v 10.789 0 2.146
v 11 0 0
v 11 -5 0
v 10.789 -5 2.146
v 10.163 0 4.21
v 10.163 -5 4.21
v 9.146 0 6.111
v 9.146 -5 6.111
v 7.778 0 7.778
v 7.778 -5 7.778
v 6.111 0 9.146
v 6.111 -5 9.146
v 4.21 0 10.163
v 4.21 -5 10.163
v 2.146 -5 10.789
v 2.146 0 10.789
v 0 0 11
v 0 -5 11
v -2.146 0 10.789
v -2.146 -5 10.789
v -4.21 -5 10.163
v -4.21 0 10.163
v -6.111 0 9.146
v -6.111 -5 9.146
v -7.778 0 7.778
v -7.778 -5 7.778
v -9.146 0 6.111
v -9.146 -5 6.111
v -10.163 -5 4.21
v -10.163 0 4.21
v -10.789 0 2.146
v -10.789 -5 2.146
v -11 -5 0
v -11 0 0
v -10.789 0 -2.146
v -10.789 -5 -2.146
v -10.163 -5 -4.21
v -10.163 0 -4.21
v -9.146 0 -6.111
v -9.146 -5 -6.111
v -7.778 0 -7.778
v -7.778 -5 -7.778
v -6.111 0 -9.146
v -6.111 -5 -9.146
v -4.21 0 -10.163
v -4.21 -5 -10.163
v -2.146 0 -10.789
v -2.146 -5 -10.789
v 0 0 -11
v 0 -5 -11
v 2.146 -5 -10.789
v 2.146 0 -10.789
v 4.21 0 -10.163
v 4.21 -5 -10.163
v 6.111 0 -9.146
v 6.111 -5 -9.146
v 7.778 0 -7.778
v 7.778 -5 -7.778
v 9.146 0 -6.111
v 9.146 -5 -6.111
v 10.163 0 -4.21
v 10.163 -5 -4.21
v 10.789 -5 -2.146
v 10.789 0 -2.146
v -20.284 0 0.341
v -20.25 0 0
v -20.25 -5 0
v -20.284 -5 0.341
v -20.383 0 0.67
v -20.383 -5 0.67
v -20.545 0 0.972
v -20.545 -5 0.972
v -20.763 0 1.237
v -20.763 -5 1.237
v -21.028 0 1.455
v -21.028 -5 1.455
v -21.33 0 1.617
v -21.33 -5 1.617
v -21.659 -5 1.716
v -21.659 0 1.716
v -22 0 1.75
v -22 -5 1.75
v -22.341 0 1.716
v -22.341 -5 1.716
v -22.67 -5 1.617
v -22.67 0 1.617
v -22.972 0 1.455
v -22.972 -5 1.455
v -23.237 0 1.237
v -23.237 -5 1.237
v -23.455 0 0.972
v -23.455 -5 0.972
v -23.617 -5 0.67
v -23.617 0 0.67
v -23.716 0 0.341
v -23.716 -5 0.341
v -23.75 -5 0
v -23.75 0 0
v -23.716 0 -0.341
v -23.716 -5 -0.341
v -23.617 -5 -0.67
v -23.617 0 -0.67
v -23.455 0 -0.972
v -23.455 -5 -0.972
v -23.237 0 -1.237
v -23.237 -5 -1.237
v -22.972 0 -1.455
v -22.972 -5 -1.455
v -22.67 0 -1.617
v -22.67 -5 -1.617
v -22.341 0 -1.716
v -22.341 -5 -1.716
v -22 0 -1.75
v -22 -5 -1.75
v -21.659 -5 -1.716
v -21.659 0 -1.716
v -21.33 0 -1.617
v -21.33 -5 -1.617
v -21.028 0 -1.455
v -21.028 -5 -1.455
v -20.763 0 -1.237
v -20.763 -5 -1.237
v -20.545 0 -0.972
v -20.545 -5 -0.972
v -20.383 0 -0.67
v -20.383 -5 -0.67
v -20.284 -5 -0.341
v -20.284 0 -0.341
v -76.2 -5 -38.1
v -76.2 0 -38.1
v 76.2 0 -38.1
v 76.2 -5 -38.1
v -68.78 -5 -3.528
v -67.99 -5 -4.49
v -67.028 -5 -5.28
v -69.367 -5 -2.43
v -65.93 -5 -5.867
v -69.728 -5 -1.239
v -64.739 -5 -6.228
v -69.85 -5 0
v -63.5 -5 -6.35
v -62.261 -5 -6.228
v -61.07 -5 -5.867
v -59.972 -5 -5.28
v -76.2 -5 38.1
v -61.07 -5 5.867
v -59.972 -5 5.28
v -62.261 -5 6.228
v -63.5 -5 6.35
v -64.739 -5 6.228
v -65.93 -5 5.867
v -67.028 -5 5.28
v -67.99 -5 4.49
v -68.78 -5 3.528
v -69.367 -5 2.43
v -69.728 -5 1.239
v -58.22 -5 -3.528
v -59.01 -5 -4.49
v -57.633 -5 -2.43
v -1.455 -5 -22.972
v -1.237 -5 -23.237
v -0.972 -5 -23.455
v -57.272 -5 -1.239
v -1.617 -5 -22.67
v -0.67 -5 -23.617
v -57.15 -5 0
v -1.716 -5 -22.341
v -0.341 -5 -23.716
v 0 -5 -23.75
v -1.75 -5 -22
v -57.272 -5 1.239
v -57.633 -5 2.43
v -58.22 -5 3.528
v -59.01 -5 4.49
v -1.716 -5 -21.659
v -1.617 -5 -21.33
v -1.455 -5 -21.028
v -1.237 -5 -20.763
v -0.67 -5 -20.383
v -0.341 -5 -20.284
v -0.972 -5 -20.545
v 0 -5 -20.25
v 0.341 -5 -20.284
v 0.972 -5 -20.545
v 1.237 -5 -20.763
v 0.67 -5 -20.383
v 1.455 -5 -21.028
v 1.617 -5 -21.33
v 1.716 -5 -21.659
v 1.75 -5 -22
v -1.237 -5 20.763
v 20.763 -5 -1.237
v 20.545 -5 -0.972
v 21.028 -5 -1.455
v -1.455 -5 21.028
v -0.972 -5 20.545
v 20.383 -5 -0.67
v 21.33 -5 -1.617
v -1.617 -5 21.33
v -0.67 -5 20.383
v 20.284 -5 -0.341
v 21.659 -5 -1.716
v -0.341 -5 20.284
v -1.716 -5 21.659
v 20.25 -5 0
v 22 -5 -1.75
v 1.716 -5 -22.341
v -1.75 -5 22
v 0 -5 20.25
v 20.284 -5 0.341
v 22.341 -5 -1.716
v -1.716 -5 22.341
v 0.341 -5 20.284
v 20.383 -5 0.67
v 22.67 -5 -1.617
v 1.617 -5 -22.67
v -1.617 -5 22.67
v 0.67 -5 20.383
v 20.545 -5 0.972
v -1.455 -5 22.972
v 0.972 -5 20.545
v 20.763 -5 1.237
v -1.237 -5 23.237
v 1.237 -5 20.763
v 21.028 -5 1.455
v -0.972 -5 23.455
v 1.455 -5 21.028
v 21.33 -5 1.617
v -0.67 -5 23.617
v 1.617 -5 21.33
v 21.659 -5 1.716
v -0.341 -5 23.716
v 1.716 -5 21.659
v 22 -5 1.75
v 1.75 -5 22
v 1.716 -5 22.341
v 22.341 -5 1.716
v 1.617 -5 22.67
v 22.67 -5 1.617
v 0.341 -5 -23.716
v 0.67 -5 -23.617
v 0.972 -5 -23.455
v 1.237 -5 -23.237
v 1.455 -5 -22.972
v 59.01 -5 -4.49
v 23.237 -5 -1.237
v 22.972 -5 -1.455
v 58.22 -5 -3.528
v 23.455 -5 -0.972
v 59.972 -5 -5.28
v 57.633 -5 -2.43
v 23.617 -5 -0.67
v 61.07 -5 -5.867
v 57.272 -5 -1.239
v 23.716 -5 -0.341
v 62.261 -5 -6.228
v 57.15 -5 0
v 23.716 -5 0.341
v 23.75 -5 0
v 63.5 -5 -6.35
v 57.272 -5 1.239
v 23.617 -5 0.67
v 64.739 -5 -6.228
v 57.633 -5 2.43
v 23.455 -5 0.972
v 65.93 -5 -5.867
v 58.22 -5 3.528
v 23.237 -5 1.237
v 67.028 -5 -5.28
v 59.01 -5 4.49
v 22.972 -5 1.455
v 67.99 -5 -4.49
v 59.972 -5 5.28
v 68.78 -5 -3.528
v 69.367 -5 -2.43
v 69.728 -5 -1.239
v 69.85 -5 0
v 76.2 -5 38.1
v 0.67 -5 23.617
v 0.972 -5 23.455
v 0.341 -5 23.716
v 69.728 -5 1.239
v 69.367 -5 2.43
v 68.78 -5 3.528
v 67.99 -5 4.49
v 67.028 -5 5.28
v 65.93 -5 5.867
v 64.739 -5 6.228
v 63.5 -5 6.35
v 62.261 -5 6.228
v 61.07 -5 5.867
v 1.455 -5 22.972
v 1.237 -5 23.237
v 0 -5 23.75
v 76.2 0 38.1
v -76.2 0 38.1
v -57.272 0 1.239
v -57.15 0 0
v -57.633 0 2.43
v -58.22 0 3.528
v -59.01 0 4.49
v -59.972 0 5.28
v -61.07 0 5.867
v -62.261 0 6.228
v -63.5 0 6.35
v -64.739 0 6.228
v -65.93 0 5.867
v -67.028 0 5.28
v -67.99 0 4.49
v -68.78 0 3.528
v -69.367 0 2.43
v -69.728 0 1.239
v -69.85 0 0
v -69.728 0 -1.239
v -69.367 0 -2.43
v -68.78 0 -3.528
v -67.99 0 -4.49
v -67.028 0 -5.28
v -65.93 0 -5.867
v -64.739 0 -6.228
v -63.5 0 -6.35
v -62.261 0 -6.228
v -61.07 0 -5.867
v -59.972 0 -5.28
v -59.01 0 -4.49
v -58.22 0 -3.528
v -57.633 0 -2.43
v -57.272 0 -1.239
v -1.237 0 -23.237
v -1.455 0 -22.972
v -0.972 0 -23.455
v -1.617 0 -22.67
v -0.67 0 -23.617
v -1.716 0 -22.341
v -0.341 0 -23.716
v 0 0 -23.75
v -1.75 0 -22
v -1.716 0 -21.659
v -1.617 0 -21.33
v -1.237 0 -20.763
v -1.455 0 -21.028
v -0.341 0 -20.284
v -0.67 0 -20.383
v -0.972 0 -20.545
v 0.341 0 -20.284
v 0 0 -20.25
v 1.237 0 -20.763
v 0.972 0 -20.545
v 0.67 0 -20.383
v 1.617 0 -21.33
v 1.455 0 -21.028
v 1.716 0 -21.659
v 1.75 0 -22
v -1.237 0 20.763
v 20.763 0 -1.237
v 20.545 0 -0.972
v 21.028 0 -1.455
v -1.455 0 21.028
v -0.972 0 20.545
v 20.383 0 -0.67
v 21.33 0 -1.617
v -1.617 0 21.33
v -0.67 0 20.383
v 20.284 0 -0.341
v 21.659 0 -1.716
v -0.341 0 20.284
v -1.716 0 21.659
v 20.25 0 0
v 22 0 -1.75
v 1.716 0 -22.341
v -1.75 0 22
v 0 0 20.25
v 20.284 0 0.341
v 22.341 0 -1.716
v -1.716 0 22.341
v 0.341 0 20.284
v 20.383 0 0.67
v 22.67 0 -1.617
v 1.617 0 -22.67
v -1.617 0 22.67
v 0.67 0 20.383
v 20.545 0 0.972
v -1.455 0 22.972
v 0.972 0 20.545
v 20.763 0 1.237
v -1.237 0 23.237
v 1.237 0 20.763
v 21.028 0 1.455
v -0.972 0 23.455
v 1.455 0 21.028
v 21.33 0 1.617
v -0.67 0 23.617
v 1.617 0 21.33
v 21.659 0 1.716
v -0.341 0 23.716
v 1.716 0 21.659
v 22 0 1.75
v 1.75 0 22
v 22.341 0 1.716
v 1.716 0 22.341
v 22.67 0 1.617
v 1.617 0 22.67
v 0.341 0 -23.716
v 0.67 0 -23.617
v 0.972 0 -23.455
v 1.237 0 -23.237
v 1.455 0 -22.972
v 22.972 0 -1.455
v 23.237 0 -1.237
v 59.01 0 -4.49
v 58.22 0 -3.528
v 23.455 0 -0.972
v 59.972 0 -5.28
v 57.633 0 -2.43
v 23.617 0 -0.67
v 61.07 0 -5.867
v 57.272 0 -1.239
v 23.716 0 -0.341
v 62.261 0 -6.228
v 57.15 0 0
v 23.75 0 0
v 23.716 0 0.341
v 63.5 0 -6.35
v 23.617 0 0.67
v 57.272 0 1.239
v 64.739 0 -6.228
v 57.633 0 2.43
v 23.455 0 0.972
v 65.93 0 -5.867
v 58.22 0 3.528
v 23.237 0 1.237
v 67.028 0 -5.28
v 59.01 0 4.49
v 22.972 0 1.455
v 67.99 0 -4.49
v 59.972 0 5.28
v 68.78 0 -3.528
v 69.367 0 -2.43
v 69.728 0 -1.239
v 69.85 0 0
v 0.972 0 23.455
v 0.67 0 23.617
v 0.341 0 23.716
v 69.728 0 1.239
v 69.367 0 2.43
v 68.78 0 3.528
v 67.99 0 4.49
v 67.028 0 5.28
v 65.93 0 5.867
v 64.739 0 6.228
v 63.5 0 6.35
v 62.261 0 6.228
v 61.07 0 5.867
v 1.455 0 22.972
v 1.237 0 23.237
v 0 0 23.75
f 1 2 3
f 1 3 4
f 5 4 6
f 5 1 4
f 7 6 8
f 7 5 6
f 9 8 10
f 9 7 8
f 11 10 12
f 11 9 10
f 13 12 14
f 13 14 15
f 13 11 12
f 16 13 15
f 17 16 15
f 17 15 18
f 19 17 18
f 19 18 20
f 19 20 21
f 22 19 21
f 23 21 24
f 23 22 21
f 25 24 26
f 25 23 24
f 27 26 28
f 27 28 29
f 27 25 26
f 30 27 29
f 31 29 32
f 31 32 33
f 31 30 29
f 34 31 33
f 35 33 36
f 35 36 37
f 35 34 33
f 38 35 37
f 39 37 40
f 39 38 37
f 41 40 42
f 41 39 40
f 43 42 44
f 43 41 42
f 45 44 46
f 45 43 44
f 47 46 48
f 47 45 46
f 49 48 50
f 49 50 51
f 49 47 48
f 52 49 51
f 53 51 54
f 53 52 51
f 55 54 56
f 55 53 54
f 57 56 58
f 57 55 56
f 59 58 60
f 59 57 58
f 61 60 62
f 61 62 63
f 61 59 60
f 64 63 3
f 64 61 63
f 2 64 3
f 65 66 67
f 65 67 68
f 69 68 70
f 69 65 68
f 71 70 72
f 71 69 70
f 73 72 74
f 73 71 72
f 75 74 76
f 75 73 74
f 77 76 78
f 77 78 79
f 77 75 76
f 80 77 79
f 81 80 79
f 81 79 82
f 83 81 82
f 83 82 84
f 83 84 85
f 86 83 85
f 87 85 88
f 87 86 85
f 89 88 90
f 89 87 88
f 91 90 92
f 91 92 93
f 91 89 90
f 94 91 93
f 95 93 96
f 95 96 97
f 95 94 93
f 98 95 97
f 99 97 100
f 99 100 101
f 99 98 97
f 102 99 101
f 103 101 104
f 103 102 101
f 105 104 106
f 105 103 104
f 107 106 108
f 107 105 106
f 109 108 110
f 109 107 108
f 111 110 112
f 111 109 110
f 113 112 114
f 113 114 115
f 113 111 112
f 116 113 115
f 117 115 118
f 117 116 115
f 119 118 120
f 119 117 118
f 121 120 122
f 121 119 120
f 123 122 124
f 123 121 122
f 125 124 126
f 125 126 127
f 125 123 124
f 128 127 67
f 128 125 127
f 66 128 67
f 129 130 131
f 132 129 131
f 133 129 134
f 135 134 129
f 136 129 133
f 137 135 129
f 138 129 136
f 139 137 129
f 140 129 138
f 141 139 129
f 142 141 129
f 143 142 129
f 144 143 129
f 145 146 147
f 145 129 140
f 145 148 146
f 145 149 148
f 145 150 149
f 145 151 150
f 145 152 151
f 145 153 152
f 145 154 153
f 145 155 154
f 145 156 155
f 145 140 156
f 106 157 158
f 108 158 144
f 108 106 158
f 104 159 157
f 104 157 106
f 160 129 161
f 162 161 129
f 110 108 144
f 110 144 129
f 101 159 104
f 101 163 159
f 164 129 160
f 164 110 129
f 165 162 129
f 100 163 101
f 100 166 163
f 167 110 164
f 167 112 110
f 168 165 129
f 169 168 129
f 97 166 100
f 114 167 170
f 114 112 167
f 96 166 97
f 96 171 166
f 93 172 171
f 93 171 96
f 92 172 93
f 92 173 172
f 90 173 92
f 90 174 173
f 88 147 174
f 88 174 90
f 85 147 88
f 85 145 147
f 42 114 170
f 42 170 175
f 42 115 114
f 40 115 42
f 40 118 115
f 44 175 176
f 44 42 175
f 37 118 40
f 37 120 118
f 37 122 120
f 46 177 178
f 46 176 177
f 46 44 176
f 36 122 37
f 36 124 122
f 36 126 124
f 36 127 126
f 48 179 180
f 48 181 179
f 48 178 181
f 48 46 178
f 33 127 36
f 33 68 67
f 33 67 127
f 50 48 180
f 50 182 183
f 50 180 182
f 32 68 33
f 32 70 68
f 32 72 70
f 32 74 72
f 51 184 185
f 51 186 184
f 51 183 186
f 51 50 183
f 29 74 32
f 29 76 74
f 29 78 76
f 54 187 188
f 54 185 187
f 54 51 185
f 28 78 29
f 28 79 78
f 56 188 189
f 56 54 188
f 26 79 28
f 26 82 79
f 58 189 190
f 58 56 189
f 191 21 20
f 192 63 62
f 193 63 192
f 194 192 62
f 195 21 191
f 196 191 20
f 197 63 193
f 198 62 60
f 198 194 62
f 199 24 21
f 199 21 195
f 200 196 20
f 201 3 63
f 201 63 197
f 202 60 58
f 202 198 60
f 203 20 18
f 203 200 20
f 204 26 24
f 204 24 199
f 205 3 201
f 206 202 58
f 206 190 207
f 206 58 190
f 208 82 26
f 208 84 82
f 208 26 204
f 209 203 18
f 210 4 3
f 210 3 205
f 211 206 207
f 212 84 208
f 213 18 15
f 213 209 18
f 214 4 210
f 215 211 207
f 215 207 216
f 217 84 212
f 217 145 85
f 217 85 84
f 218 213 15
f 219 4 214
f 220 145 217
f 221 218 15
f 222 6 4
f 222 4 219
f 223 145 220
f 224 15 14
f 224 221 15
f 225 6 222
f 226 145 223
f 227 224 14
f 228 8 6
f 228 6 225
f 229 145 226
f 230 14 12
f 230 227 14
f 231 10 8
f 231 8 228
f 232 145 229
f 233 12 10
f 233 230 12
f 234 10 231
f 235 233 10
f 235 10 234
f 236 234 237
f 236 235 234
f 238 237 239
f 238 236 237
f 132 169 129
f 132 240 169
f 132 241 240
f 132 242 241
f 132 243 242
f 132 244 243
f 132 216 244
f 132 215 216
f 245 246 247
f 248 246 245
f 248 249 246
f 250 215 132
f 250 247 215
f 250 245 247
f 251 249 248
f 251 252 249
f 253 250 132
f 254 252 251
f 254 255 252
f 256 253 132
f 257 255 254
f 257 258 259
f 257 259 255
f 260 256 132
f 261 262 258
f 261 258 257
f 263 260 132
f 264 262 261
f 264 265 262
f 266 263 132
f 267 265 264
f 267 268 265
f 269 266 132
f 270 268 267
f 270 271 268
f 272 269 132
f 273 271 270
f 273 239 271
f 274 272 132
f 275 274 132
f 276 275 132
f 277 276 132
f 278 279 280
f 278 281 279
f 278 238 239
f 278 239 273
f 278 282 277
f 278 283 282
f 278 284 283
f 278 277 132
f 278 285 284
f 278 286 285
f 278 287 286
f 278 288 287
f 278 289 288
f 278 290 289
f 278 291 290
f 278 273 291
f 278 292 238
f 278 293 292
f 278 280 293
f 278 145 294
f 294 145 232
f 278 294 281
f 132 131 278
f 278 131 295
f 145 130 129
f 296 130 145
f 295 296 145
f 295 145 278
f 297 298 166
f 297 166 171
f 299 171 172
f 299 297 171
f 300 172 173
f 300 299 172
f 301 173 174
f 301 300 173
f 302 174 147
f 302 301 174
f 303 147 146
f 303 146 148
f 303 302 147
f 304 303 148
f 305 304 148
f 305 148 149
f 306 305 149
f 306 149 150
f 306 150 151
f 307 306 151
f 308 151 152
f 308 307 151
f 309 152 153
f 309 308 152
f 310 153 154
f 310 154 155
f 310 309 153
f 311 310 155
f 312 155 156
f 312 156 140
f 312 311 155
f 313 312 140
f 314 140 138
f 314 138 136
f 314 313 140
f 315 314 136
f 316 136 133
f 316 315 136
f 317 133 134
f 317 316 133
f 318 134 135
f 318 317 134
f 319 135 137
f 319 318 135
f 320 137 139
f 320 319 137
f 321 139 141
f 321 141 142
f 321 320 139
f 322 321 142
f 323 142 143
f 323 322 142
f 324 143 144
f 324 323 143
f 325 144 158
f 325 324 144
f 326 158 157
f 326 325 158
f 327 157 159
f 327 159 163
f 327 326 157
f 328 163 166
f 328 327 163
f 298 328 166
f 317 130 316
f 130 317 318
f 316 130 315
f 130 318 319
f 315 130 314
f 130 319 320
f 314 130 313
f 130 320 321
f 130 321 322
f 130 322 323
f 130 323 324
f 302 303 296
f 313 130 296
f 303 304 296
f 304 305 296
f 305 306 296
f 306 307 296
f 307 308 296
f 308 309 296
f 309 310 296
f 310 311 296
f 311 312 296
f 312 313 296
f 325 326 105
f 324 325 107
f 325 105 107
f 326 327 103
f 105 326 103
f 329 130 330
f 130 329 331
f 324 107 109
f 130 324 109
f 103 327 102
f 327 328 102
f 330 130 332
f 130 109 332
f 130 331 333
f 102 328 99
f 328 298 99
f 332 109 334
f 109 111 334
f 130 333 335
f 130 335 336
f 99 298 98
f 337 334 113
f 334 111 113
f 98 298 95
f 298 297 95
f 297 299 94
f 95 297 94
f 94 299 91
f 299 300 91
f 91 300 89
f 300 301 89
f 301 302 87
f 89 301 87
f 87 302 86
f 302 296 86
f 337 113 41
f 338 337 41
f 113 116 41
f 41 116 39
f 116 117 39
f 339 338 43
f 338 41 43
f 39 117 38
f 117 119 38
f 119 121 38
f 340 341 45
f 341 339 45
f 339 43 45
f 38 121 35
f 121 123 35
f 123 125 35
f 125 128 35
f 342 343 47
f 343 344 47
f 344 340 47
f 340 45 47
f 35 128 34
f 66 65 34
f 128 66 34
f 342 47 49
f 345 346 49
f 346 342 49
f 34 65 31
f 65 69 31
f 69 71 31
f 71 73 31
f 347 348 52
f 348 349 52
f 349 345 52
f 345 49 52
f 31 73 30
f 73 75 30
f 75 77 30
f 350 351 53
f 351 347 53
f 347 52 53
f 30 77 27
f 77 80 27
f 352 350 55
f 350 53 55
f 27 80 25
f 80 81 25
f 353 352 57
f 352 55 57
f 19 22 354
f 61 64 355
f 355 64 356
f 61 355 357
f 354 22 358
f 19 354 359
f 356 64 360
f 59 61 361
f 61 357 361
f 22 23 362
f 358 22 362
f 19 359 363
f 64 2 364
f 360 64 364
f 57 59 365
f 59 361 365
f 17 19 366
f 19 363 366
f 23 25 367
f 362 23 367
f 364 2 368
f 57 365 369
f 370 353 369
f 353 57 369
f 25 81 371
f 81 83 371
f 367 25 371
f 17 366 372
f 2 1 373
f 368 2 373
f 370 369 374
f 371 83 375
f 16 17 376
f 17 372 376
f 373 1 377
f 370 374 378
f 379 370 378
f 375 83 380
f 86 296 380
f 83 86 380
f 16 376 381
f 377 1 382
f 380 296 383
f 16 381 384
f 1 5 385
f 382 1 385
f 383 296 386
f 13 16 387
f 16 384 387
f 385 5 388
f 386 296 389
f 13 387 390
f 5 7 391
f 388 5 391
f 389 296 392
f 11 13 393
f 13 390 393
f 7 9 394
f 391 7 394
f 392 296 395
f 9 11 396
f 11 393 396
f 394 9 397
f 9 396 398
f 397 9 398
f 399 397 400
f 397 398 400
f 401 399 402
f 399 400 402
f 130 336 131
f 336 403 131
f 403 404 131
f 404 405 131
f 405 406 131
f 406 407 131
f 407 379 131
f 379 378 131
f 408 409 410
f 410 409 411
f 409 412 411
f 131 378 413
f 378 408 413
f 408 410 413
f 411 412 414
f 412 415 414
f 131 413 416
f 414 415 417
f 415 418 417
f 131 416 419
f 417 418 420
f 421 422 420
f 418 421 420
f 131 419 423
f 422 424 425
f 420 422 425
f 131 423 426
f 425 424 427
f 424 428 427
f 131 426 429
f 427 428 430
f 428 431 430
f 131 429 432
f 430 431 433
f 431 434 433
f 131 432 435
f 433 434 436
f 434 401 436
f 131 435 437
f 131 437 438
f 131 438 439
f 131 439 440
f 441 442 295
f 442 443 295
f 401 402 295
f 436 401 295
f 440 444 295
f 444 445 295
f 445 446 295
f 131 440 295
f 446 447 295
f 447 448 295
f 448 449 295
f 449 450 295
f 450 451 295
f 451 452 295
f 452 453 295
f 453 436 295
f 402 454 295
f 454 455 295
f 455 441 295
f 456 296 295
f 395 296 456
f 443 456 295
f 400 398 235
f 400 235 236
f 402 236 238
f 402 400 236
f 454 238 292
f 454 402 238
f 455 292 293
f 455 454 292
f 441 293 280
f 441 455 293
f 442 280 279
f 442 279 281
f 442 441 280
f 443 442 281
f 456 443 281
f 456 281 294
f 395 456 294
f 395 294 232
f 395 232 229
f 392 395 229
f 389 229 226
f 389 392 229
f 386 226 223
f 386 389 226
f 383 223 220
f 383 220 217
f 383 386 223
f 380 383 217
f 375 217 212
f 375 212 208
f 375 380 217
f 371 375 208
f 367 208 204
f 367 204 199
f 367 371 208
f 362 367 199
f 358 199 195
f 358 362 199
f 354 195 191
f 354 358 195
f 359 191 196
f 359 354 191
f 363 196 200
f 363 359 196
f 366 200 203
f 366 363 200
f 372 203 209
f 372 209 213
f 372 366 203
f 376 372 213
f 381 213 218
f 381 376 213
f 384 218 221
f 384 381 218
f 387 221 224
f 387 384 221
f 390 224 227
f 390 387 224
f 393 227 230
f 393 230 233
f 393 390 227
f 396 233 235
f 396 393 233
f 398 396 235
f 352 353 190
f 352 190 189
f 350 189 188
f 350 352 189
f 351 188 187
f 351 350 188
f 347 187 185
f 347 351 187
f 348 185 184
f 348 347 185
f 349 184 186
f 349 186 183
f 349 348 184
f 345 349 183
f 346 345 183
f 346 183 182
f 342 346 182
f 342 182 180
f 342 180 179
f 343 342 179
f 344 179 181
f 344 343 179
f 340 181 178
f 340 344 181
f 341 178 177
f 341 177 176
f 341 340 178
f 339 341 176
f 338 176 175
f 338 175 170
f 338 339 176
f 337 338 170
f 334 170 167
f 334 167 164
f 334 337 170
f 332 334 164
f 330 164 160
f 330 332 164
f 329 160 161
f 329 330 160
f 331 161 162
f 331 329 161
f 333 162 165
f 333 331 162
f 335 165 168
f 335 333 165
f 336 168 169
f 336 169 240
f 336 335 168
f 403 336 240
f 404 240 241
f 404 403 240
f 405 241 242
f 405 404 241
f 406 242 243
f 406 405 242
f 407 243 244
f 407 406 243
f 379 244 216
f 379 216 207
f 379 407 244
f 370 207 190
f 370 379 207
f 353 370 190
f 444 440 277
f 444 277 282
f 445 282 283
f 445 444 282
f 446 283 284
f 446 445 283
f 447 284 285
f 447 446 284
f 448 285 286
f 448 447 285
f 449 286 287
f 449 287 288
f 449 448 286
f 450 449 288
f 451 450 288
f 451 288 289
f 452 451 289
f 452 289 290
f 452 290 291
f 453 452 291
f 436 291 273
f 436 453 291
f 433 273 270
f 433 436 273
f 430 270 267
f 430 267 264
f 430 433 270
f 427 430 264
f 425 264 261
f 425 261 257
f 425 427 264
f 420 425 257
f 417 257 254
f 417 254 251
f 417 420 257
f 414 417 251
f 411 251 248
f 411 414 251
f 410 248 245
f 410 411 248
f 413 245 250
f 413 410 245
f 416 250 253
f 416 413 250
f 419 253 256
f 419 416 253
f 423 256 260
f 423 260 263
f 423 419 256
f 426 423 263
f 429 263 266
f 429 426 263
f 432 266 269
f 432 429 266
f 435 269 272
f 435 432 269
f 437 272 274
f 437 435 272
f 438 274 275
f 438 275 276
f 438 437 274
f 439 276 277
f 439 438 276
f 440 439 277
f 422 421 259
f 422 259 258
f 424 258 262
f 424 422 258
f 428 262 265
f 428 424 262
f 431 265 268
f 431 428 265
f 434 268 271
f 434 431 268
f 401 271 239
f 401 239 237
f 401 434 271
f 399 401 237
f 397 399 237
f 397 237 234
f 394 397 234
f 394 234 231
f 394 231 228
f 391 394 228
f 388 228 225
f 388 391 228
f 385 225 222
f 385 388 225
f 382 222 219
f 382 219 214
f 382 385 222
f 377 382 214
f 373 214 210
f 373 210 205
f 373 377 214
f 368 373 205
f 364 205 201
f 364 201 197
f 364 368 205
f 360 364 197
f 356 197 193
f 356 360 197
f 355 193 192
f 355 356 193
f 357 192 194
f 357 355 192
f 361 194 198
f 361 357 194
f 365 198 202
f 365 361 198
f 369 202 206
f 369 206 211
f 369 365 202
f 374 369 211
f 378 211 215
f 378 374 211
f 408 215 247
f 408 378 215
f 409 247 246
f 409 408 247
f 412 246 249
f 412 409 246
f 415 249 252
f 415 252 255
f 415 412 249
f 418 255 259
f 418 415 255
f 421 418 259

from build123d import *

# Parameters (mm, degrees)
F0_W     = 152.4
F0_H     = 76.2
F0_R     = 1.75
F0_R_2   = 6.35
F0_R_3   = 11
F1_DEPTH = 5


with BuildPart() as f1:
    # F0 (on Front) → F1 (new body)
    with BuildSketch(Plane.XZ):
        Rectangle(F0_W, F0_H)
        with Locations((0, -22)):
            Circle(F0_R, mode=Mode.SUBTRACT)
        with Locations((-63.5, 0)):
            Circle(F0_R_2, mode=Mode.SUBTRACT)
        with Locations((-22, 0)):
            Circle(F0_R, mode=Mode.SUBTRACT)
        Circle(F0_R_3, mode=Mode.SUBTRACT)
        with Locations((22, 0)):
            Circle(F0_R, mode=Mode.SUBTRACT)
        with Locations((63.5, 0)):
            Circle(F0_R_2, mode=Mode.SUBTRACT)
        with Locations((0, 22)):
            Circle(F0_R, mode=Mode.SUBTRACT)
    extrude(amount=F1_DEPTH)


solid = f1.part
